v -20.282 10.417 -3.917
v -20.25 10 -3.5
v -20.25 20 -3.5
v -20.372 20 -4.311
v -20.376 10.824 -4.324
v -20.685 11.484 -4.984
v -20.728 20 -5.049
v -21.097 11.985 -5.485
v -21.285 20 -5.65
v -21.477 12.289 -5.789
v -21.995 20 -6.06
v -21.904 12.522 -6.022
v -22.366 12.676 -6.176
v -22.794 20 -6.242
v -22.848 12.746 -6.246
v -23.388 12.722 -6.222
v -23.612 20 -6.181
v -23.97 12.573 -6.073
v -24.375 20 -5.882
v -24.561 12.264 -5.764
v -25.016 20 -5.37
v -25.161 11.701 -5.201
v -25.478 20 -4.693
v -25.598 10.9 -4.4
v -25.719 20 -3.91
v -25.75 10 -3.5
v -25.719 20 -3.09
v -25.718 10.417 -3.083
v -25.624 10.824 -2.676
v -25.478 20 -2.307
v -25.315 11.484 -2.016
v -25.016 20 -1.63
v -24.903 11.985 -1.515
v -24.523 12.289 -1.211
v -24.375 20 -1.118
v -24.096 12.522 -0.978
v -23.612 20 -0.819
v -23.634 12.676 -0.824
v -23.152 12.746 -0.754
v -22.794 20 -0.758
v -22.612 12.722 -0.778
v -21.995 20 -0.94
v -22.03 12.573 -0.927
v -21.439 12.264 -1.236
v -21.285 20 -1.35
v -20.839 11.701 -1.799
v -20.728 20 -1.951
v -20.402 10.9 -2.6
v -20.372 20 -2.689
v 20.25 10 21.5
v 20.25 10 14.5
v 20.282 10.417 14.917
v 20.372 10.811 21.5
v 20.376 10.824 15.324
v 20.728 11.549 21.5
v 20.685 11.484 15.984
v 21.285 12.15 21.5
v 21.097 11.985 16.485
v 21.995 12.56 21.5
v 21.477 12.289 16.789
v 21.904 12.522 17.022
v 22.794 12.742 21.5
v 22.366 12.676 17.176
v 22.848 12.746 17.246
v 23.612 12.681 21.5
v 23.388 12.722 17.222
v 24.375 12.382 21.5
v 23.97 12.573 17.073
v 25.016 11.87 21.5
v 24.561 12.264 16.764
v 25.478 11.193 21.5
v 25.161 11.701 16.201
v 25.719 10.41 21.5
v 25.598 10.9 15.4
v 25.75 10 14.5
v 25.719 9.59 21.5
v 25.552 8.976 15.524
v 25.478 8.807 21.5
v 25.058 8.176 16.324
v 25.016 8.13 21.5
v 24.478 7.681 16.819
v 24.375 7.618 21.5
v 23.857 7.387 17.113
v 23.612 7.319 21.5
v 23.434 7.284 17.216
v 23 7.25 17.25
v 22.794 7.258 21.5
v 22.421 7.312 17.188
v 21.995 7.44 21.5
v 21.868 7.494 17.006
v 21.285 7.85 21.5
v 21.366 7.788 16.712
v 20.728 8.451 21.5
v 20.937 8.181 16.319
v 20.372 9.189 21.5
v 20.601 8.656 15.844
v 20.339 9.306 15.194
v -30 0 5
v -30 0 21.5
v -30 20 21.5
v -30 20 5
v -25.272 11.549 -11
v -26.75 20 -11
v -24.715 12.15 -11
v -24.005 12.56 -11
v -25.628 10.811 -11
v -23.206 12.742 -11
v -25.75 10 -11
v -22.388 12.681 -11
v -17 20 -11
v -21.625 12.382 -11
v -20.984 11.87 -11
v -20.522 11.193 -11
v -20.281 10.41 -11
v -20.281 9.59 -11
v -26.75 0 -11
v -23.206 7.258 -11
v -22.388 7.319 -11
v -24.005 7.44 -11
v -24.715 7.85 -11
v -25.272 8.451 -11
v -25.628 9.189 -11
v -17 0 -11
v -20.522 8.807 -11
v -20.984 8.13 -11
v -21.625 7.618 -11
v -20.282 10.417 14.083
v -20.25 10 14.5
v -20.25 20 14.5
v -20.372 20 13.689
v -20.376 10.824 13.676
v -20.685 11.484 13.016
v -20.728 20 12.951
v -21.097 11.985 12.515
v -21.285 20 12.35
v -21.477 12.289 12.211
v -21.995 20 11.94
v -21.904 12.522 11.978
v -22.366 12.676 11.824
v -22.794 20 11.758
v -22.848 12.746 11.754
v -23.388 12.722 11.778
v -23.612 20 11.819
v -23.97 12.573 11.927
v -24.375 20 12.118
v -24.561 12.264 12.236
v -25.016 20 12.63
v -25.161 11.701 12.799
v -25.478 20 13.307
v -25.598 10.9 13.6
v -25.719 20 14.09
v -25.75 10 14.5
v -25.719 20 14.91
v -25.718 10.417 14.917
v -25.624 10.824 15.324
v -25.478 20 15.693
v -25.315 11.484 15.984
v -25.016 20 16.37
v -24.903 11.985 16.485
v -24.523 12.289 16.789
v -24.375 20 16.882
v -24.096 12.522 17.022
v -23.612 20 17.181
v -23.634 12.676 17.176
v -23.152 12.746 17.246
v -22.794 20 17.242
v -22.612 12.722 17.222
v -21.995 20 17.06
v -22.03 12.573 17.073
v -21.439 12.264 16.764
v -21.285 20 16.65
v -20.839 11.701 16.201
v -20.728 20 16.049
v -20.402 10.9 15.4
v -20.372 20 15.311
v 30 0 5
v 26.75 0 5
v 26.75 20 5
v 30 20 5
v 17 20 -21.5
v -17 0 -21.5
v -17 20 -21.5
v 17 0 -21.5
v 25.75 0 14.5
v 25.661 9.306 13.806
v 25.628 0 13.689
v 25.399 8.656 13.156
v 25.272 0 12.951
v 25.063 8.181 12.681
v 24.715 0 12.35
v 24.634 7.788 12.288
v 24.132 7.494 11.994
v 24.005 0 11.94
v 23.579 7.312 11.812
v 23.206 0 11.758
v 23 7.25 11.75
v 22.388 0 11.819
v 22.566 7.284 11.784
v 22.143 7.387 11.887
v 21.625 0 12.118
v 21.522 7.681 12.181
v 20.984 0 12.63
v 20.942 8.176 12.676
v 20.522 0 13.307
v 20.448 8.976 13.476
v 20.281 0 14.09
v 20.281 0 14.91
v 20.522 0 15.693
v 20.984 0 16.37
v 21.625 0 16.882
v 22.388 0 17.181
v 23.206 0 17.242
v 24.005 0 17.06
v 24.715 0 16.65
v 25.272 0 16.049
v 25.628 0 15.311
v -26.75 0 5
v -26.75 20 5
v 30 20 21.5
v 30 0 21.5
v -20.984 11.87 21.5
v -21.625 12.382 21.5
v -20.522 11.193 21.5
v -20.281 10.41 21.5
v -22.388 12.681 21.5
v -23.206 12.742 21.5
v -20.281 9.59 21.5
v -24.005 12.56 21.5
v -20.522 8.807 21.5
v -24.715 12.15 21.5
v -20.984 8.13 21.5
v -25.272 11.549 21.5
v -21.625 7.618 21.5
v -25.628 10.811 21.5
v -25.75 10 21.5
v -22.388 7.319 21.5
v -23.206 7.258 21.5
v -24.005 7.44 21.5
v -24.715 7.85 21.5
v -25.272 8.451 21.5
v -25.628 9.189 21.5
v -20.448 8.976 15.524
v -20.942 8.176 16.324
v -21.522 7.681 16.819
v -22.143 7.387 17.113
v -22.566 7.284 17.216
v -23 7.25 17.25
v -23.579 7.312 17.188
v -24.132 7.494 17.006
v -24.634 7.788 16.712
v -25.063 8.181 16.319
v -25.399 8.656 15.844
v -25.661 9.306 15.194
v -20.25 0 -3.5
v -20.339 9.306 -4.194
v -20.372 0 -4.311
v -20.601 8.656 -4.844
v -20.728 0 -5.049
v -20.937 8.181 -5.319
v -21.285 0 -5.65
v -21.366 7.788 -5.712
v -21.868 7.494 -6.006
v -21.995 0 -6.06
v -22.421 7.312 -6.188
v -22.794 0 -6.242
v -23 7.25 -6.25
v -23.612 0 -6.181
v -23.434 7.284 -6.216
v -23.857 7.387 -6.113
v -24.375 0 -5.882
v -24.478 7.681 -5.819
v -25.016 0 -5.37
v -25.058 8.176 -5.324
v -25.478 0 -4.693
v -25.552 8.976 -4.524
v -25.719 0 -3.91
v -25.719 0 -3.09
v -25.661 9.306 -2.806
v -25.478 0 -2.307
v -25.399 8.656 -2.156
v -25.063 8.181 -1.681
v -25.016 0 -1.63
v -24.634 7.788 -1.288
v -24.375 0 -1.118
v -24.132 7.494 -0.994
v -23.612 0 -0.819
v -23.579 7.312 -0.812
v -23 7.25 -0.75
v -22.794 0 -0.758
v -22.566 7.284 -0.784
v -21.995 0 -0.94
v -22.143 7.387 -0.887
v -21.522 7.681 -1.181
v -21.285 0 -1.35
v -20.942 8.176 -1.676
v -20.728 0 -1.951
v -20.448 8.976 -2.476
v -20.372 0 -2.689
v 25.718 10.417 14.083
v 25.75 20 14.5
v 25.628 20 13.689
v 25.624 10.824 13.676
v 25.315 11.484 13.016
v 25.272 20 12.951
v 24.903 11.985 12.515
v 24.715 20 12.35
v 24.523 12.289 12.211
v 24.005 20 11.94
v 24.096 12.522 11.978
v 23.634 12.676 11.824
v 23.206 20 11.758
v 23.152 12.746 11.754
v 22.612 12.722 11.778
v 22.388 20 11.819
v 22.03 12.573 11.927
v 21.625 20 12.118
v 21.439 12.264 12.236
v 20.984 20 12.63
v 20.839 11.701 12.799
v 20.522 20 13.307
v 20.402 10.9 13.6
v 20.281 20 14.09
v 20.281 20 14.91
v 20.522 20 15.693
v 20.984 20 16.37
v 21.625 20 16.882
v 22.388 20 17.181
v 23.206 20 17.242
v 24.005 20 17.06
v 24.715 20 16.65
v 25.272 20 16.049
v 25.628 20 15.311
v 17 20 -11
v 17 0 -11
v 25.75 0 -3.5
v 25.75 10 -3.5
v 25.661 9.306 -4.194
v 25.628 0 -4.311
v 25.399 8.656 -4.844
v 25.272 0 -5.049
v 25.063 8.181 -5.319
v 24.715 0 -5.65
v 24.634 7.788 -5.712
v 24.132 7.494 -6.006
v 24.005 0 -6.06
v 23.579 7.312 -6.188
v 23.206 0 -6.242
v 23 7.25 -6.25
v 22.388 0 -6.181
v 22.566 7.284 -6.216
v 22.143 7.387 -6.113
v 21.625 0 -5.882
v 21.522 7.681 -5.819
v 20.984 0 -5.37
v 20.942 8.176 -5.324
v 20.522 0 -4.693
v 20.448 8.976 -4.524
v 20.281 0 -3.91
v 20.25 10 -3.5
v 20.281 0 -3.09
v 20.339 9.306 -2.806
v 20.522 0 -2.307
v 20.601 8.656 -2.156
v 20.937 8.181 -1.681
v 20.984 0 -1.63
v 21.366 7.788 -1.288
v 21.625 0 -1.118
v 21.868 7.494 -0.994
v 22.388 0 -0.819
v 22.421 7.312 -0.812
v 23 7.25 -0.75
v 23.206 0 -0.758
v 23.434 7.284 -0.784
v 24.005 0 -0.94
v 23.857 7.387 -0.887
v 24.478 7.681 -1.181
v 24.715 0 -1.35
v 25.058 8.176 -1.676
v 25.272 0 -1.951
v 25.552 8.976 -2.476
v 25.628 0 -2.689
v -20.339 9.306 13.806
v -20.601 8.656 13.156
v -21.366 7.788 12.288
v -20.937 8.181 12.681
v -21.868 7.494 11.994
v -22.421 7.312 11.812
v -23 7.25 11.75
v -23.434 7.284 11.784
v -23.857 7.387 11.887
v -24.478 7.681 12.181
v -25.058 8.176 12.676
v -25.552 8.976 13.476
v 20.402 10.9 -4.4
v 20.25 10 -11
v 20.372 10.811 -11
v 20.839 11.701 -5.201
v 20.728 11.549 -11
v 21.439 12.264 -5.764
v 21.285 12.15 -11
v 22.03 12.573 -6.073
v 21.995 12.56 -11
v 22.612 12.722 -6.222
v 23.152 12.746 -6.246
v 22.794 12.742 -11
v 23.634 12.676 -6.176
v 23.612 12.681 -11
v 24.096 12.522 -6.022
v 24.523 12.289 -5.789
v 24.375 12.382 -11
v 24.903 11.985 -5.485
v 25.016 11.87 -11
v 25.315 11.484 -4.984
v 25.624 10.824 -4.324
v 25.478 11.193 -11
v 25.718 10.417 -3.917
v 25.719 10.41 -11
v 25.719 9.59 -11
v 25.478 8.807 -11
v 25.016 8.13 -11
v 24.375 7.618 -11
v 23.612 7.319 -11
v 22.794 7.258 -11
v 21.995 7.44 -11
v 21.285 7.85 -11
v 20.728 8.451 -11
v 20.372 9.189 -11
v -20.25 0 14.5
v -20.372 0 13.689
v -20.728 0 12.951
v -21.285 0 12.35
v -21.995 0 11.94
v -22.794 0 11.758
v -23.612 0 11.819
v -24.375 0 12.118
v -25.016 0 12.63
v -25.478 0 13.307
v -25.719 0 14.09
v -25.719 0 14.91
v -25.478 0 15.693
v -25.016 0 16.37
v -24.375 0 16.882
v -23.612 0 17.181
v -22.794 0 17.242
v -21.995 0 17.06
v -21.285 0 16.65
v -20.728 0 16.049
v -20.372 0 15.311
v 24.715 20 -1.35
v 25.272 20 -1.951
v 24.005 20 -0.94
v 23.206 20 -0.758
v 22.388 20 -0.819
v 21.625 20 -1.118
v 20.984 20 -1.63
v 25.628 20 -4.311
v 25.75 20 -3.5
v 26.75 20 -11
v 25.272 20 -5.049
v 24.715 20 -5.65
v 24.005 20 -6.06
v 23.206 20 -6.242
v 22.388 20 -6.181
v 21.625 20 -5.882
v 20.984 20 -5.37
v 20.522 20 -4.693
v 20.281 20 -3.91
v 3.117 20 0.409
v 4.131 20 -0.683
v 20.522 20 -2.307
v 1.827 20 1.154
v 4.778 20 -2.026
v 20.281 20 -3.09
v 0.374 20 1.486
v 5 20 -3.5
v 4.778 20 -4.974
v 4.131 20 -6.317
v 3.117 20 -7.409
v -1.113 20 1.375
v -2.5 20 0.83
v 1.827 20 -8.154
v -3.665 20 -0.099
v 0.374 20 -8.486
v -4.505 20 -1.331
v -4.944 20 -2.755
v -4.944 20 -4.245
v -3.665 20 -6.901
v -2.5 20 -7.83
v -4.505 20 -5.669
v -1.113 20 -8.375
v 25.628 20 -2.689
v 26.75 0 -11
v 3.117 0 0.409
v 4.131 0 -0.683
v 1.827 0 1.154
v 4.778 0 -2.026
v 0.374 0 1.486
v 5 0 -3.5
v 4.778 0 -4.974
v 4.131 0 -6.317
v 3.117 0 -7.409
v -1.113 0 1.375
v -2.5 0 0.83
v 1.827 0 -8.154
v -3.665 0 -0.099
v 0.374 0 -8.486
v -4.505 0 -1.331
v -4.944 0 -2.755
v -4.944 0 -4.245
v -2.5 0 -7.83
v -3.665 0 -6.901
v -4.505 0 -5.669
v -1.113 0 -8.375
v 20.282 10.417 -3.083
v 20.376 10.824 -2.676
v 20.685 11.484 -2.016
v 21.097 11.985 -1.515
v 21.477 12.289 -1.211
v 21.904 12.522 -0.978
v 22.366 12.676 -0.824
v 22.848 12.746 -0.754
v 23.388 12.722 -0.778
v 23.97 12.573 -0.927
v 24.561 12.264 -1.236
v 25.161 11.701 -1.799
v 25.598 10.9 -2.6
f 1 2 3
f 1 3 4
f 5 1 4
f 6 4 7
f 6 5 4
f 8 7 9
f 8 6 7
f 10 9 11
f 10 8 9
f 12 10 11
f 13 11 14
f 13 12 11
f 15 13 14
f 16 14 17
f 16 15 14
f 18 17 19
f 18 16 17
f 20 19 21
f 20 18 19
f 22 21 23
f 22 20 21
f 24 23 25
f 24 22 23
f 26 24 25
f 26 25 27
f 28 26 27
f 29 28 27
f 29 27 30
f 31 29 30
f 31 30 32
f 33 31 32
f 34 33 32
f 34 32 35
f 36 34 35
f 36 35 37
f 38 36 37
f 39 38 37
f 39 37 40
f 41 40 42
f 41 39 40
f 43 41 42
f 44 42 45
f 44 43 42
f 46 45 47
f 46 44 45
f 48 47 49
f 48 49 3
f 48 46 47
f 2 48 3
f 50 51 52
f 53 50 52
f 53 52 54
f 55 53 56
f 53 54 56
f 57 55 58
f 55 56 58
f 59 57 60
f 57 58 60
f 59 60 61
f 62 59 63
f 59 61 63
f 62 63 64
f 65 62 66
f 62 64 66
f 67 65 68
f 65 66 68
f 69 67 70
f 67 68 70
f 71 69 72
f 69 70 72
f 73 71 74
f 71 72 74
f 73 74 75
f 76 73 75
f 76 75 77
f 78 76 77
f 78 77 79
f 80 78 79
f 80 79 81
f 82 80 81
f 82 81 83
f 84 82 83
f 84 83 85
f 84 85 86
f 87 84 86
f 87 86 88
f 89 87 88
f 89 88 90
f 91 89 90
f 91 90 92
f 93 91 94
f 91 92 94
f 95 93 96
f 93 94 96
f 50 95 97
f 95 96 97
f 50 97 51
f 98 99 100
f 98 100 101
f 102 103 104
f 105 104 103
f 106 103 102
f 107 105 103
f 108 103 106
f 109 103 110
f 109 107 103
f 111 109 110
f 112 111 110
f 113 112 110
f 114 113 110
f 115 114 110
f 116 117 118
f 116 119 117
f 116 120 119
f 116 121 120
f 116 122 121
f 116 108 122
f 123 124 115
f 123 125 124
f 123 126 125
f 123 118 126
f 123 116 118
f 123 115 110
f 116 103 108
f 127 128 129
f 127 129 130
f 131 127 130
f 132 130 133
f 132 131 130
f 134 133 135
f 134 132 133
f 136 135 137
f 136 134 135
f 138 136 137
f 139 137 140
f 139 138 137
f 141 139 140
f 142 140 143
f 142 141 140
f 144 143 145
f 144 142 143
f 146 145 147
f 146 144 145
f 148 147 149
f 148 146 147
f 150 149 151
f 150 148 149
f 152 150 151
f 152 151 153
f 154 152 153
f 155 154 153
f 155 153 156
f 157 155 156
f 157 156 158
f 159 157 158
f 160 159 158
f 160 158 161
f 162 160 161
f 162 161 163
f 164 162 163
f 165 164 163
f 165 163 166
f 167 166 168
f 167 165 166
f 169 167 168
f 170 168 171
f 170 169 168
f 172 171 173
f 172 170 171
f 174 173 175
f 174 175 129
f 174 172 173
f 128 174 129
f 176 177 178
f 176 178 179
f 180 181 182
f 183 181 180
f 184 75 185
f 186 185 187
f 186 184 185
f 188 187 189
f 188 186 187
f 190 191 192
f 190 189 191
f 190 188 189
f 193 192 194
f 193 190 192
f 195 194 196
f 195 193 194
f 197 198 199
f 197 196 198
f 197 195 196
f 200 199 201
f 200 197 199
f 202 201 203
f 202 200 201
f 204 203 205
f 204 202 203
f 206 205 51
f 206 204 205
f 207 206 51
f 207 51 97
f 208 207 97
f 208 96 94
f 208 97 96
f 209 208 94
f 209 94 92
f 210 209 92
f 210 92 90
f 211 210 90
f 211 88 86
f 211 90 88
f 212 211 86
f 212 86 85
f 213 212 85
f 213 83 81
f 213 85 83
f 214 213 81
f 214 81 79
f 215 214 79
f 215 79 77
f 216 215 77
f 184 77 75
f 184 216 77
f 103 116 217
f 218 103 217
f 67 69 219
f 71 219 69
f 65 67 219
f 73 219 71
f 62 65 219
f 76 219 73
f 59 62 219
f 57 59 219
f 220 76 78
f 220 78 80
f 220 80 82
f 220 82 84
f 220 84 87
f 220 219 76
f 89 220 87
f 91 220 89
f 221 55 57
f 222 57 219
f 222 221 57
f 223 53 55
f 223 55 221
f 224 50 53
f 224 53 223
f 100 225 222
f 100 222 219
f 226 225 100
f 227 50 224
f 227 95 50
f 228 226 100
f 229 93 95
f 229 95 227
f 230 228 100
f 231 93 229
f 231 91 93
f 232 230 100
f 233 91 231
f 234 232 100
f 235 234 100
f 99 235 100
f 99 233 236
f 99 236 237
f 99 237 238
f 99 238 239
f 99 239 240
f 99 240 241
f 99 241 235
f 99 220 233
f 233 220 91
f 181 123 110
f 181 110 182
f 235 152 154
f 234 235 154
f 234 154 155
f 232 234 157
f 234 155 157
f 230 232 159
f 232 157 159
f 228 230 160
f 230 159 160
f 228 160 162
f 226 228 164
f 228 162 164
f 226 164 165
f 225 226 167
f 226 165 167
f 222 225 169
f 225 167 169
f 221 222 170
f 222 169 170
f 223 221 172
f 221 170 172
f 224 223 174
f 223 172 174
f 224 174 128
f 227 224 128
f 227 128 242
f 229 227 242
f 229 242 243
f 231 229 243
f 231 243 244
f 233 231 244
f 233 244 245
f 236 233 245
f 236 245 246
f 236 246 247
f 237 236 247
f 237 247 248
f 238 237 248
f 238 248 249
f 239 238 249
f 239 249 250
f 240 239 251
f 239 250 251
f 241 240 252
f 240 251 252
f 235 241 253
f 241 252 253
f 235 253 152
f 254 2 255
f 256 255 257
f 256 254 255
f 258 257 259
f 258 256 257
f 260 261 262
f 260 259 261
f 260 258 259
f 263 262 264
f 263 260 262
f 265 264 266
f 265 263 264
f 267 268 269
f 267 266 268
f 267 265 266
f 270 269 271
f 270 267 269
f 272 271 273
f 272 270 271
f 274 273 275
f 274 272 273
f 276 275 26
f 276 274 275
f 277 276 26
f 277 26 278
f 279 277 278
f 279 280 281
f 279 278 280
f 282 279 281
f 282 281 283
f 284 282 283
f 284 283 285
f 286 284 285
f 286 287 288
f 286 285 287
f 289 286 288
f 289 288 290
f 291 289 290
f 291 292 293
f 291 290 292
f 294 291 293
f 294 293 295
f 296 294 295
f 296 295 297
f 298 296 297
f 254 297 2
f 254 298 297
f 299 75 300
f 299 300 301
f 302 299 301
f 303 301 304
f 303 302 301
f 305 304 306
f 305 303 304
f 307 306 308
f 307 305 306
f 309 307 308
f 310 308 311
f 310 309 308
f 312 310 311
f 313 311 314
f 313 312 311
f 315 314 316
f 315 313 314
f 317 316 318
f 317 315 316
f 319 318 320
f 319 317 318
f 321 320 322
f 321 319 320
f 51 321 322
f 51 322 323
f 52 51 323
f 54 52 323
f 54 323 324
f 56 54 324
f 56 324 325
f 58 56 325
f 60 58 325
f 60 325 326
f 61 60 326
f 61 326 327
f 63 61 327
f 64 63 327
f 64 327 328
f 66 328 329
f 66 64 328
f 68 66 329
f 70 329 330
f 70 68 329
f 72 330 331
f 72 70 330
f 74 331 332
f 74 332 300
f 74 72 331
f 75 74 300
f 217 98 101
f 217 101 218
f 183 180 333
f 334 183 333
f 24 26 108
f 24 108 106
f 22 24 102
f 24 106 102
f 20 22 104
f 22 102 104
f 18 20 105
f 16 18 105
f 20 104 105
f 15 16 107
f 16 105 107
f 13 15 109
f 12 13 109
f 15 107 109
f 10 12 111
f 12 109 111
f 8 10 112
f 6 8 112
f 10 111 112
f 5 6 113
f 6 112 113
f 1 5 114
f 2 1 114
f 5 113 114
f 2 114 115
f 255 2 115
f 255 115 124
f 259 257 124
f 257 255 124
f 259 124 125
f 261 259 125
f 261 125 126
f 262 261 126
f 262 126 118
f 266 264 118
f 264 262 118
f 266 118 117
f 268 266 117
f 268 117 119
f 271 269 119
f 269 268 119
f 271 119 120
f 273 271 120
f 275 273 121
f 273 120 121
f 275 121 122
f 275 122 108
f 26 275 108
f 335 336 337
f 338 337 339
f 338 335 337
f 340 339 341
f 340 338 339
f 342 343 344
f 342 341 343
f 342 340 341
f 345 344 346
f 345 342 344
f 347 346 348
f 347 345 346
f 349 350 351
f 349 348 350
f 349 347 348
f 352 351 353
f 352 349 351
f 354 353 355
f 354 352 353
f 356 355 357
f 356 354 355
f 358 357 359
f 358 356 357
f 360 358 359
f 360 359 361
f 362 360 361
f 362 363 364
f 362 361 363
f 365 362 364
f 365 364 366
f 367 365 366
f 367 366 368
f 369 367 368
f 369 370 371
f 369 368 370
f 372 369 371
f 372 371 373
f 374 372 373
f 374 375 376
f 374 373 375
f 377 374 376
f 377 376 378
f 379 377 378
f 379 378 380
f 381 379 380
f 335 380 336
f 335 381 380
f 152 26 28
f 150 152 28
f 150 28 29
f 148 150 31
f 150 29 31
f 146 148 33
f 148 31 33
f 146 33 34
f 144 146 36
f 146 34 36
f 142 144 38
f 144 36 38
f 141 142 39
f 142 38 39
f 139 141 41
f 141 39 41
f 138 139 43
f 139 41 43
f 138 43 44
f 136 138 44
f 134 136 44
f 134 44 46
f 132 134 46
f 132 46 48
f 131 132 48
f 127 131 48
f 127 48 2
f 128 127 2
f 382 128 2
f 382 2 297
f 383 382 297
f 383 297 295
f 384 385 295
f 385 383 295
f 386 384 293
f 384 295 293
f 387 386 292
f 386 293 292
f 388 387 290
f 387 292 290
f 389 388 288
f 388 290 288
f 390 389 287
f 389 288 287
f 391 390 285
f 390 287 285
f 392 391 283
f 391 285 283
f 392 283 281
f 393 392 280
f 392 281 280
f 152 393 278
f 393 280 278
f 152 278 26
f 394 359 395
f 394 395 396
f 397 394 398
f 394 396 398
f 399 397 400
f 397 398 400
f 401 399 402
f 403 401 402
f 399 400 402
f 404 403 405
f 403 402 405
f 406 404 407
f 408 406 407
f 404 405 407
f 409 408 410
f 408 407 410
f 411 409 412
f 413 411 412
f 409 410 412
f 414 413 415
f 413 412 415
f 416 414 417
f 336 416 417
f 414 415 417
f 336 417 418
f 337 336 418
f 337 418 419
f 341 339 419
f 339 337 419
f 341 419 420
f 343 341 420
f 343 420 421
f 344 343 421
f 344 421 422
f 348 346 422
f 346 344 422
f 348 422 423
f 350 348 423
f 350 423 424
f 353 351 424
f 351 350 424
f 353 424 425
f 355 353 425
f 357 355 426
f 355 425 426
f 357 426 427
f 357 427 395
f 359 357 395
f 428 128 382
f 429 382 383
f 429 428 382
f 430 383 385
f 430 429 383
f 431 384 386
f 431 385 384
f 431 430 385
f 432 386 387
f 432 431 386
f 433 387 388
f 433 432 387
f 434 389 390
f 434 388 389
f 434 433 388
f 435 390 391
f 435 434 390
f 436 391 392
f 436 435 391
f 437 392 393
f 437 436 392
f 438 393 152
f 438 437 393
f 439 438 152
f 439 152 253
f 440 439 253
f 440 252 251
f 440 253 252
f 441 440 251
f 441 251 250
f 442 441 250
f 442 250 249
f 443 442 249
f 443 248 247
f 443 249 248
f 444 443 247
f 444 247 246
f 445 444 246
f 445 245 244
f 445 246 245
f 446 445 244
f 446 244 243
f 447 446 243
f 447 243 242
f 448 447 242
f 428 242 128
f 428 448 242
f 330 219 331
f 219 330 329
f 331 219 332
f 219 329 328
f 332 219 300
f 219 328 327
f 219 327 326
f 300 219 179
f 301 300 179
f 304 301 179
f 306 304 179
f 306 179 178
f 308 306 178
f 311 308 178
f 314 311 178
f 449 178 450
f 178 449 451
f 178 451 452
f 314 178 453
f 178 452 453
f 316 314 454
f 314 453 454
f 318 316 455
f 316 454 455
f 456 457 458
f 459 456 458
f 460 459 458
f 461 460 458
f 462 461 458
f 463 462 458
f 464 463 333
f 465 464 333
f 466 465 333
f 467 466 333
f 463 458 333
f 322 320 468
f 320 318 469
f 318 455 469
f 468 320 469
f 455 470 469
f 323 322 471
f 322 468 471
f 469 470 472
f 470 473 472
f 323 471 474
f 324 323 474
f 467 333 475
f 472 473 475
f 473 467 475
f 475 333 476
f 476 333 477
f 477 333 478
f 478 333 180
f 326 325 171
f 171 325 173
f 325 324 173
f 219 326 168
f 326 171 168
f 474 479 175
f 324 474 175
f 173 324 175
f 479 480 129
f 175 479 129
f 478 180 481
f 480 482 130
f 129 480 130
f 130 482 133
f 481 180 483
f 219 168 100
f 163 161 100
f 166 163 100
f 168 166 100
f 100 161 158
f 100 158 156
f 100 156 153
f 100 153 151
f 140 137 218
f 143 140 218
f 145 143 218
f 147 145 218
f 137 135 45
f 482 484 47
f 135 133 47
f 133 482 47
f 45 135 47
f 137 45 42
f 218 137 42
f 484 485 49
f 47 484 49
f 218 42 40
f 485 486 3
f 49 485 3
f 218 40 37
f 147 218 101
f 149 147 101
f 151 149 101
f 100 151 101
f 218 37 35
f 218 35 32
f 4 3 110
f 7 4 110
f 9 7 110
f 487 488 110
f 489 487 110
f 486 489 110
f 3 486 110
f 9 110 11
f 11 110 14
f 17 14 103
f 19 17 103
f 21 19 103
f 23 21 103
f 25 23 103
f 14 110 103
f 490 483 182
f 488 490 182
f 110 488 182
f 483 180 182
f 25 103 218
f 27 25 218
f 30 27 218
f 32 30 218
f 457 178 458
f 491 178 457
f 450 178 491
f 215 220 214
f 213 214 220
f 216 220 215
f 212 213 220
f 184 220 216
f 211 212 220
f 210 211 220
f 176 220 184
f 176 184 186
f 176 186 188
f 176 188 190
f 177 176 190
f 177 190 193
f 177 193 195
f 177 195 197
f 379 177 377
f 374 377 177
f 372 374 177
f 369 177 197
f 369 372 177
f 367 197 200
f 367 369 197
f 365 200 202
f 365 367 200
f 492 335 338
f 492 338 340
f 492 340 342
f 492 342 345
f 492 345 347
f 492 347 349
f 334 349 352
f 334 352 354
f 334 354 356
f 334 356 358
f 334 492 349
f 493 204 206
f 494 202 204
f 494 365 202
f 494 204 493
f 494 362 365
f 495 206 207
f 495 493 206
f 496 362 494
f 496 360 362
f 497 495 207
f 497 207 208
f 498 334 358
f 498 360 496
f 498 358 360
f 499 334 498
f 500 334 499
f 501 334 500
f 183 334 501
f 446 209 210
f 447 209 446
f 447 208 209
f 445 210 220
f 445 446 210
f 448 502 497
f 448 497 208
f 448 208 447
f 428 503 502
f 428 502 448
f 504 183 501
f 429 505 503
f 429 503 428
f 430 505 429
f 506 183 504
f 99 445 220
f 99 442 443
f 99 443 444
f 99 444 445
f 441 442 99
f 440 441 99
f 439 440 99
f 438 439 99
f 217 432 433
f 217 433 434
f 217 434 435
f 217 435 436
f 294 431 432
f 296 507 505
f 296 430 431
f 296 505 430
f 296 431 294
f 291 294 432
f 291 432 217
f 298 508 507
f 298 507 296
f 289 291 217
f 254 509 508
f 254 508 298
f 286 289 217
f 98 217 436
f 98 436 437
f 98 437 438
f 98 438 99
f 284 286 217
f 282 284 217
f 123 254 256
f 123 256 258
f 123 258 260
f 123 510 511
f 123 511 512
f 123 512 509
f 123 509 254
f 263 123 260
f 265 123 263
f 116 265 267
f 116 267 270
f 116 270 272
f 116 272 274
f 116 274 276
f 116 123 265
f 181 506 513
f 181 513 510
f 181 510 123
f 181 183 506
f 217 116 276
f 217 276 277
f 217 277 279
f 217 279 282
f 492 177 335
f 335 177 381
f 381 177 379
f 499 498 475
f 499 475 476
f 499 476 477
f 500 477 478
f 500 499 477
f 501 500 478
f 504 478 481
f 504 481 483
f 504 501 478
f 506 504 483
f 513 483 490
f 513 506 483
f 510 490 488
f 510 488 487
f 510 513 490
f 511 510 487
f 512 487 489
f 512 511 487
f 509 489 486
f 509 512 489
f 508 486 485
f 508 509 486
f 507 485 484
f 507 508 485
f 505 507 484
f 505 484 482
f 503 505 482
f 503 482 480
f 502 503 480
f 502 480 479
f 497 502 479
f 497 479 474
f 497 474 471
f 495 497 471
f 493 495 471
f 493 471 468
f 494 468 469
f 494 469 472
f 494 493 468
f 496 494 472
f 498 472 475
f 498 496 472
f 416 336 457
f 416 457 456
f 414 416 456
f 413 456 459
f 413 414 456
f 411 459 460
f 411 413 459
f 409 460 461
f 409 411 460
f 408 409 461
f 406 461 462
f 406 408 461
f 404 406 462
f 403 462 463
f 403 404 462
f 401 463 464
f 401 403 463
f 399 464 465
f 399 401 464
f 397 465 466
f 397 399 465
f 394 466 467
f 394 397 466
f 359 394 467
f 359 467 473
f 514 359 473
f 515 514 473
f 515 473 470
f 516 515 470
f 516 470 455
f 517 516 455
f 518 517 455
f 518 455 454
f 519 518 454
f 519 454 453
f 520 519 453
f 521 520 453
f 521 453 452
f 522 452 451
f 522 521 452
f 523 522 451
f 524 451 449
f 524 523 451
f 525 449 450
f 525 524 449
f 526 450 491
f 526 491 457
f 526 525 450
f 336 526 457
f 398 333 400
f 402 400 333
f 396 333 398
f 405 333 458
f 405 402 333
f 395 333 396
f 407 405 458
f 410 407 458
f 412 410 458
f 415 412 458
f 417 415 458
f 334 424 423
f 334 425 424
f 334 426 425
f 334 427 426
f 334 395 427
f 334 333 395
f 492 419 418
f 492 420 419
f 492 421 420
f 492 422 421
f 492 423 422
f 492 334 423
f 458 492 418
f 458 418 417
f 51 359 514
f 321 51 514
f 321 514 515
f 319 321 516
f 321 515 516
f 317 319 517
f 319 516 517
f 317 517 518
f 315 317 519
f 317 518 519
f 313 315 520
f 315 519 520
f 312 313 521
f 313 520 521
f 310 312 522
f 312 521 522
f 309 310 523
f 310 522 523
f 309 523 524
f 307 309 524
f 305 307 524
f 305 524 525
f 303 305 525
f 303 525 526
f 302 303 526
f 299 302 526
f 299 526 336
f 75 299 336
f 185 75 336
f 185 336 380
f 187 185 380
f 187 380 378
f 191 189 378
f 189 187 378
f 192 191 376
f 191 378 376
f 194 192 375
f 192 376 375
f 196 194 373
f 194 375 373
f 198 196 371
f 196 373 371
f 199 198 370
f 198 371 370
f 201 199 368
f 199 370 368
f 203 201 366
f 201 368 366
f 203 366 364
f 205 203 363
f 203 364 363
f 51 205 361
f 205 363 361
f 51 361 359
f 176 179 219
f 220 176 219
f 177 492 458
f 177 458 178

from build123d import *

# Parameters (mm, degrees)
SKETCH1_R           = 5
SKETCH1_R_2         = 2.75
BOSS_EXTRUDE1_DEPTH = 20
SKETCH2_R           = 2.75
CUT_EXTRUDE1_DEPTH  = 33.5
SKETCH3_W           = 6.5
SKETCH3_H           = 32
CUT_EXTRUDE2_DEPTH  = 21


with BuildPart() as part:
    # Sketch1 → Boss-Extrude1 (new body)
    with BuildSketch(Plane(origin=(0, 0, 0), x_dir=(1, 0, 0), z_dir=(0, 1, 0))):
        Polygon((30, -21.5), (-30, -21.5), (-30, 11), (-17, 11), (-17, 21.5), (17, 21.5), (17, 11), (30, 11), align=None)
        with Locations((0, 3.5)):
            Circle(SKETCH1_R, mode=Mode.SUBTRACT)
        with Locations((-23, 3.5)):
            Circle(SKETCH1_R_2, mode=Mode.SUBTRACT)
        with Locations((-23, -14.5)):
            Circle(SKETCH1_R_2, mode=Mode.SUBTRACT)
        with Locations((23, 3.5)):
            Circle(SKETCH1_R_2, mode=Mode.SUBTRACT)
        with Locations((23, -14.5)):
            Circle(SKETCH1_R_2, mode=Mode.SUBTRACT)
    extrude(amount=BOSS_EXTRUDE1_DEPTH)

    # Sketch2 → Cut-Extrude1 (cut, through all)
    with BuildSketch(Plane(origin=(0, 0, -11), x_dir=(-1, 0, 0), z_dir=(0, 0, -1))):
        with Locations((-23, 10)):
            Circle(SKETCH2_R)
        with Locations((23, 10)):
            Circle(SKETCH2_R)
    extrude(amount=-CUT_EXTRUDE1_DEPTH, mode=Mode.SUBTRACT)

    # Sketch3 → Cut-Extrude2 (cut, through all)
    with BuildSketch(Plane.XZ):
        with Locations((30, -11)):
            Rectangle(SKETCH3_W, SKETCH3_H)
        with Locations((-30, -11)):
            Rectangle(SKETCH3_W, SKETCH3_H)
    extrude(amount=-CUT_EXTRUDE2_DEPTH, mode=Mode.SUBTRACT)


solid = part.part
